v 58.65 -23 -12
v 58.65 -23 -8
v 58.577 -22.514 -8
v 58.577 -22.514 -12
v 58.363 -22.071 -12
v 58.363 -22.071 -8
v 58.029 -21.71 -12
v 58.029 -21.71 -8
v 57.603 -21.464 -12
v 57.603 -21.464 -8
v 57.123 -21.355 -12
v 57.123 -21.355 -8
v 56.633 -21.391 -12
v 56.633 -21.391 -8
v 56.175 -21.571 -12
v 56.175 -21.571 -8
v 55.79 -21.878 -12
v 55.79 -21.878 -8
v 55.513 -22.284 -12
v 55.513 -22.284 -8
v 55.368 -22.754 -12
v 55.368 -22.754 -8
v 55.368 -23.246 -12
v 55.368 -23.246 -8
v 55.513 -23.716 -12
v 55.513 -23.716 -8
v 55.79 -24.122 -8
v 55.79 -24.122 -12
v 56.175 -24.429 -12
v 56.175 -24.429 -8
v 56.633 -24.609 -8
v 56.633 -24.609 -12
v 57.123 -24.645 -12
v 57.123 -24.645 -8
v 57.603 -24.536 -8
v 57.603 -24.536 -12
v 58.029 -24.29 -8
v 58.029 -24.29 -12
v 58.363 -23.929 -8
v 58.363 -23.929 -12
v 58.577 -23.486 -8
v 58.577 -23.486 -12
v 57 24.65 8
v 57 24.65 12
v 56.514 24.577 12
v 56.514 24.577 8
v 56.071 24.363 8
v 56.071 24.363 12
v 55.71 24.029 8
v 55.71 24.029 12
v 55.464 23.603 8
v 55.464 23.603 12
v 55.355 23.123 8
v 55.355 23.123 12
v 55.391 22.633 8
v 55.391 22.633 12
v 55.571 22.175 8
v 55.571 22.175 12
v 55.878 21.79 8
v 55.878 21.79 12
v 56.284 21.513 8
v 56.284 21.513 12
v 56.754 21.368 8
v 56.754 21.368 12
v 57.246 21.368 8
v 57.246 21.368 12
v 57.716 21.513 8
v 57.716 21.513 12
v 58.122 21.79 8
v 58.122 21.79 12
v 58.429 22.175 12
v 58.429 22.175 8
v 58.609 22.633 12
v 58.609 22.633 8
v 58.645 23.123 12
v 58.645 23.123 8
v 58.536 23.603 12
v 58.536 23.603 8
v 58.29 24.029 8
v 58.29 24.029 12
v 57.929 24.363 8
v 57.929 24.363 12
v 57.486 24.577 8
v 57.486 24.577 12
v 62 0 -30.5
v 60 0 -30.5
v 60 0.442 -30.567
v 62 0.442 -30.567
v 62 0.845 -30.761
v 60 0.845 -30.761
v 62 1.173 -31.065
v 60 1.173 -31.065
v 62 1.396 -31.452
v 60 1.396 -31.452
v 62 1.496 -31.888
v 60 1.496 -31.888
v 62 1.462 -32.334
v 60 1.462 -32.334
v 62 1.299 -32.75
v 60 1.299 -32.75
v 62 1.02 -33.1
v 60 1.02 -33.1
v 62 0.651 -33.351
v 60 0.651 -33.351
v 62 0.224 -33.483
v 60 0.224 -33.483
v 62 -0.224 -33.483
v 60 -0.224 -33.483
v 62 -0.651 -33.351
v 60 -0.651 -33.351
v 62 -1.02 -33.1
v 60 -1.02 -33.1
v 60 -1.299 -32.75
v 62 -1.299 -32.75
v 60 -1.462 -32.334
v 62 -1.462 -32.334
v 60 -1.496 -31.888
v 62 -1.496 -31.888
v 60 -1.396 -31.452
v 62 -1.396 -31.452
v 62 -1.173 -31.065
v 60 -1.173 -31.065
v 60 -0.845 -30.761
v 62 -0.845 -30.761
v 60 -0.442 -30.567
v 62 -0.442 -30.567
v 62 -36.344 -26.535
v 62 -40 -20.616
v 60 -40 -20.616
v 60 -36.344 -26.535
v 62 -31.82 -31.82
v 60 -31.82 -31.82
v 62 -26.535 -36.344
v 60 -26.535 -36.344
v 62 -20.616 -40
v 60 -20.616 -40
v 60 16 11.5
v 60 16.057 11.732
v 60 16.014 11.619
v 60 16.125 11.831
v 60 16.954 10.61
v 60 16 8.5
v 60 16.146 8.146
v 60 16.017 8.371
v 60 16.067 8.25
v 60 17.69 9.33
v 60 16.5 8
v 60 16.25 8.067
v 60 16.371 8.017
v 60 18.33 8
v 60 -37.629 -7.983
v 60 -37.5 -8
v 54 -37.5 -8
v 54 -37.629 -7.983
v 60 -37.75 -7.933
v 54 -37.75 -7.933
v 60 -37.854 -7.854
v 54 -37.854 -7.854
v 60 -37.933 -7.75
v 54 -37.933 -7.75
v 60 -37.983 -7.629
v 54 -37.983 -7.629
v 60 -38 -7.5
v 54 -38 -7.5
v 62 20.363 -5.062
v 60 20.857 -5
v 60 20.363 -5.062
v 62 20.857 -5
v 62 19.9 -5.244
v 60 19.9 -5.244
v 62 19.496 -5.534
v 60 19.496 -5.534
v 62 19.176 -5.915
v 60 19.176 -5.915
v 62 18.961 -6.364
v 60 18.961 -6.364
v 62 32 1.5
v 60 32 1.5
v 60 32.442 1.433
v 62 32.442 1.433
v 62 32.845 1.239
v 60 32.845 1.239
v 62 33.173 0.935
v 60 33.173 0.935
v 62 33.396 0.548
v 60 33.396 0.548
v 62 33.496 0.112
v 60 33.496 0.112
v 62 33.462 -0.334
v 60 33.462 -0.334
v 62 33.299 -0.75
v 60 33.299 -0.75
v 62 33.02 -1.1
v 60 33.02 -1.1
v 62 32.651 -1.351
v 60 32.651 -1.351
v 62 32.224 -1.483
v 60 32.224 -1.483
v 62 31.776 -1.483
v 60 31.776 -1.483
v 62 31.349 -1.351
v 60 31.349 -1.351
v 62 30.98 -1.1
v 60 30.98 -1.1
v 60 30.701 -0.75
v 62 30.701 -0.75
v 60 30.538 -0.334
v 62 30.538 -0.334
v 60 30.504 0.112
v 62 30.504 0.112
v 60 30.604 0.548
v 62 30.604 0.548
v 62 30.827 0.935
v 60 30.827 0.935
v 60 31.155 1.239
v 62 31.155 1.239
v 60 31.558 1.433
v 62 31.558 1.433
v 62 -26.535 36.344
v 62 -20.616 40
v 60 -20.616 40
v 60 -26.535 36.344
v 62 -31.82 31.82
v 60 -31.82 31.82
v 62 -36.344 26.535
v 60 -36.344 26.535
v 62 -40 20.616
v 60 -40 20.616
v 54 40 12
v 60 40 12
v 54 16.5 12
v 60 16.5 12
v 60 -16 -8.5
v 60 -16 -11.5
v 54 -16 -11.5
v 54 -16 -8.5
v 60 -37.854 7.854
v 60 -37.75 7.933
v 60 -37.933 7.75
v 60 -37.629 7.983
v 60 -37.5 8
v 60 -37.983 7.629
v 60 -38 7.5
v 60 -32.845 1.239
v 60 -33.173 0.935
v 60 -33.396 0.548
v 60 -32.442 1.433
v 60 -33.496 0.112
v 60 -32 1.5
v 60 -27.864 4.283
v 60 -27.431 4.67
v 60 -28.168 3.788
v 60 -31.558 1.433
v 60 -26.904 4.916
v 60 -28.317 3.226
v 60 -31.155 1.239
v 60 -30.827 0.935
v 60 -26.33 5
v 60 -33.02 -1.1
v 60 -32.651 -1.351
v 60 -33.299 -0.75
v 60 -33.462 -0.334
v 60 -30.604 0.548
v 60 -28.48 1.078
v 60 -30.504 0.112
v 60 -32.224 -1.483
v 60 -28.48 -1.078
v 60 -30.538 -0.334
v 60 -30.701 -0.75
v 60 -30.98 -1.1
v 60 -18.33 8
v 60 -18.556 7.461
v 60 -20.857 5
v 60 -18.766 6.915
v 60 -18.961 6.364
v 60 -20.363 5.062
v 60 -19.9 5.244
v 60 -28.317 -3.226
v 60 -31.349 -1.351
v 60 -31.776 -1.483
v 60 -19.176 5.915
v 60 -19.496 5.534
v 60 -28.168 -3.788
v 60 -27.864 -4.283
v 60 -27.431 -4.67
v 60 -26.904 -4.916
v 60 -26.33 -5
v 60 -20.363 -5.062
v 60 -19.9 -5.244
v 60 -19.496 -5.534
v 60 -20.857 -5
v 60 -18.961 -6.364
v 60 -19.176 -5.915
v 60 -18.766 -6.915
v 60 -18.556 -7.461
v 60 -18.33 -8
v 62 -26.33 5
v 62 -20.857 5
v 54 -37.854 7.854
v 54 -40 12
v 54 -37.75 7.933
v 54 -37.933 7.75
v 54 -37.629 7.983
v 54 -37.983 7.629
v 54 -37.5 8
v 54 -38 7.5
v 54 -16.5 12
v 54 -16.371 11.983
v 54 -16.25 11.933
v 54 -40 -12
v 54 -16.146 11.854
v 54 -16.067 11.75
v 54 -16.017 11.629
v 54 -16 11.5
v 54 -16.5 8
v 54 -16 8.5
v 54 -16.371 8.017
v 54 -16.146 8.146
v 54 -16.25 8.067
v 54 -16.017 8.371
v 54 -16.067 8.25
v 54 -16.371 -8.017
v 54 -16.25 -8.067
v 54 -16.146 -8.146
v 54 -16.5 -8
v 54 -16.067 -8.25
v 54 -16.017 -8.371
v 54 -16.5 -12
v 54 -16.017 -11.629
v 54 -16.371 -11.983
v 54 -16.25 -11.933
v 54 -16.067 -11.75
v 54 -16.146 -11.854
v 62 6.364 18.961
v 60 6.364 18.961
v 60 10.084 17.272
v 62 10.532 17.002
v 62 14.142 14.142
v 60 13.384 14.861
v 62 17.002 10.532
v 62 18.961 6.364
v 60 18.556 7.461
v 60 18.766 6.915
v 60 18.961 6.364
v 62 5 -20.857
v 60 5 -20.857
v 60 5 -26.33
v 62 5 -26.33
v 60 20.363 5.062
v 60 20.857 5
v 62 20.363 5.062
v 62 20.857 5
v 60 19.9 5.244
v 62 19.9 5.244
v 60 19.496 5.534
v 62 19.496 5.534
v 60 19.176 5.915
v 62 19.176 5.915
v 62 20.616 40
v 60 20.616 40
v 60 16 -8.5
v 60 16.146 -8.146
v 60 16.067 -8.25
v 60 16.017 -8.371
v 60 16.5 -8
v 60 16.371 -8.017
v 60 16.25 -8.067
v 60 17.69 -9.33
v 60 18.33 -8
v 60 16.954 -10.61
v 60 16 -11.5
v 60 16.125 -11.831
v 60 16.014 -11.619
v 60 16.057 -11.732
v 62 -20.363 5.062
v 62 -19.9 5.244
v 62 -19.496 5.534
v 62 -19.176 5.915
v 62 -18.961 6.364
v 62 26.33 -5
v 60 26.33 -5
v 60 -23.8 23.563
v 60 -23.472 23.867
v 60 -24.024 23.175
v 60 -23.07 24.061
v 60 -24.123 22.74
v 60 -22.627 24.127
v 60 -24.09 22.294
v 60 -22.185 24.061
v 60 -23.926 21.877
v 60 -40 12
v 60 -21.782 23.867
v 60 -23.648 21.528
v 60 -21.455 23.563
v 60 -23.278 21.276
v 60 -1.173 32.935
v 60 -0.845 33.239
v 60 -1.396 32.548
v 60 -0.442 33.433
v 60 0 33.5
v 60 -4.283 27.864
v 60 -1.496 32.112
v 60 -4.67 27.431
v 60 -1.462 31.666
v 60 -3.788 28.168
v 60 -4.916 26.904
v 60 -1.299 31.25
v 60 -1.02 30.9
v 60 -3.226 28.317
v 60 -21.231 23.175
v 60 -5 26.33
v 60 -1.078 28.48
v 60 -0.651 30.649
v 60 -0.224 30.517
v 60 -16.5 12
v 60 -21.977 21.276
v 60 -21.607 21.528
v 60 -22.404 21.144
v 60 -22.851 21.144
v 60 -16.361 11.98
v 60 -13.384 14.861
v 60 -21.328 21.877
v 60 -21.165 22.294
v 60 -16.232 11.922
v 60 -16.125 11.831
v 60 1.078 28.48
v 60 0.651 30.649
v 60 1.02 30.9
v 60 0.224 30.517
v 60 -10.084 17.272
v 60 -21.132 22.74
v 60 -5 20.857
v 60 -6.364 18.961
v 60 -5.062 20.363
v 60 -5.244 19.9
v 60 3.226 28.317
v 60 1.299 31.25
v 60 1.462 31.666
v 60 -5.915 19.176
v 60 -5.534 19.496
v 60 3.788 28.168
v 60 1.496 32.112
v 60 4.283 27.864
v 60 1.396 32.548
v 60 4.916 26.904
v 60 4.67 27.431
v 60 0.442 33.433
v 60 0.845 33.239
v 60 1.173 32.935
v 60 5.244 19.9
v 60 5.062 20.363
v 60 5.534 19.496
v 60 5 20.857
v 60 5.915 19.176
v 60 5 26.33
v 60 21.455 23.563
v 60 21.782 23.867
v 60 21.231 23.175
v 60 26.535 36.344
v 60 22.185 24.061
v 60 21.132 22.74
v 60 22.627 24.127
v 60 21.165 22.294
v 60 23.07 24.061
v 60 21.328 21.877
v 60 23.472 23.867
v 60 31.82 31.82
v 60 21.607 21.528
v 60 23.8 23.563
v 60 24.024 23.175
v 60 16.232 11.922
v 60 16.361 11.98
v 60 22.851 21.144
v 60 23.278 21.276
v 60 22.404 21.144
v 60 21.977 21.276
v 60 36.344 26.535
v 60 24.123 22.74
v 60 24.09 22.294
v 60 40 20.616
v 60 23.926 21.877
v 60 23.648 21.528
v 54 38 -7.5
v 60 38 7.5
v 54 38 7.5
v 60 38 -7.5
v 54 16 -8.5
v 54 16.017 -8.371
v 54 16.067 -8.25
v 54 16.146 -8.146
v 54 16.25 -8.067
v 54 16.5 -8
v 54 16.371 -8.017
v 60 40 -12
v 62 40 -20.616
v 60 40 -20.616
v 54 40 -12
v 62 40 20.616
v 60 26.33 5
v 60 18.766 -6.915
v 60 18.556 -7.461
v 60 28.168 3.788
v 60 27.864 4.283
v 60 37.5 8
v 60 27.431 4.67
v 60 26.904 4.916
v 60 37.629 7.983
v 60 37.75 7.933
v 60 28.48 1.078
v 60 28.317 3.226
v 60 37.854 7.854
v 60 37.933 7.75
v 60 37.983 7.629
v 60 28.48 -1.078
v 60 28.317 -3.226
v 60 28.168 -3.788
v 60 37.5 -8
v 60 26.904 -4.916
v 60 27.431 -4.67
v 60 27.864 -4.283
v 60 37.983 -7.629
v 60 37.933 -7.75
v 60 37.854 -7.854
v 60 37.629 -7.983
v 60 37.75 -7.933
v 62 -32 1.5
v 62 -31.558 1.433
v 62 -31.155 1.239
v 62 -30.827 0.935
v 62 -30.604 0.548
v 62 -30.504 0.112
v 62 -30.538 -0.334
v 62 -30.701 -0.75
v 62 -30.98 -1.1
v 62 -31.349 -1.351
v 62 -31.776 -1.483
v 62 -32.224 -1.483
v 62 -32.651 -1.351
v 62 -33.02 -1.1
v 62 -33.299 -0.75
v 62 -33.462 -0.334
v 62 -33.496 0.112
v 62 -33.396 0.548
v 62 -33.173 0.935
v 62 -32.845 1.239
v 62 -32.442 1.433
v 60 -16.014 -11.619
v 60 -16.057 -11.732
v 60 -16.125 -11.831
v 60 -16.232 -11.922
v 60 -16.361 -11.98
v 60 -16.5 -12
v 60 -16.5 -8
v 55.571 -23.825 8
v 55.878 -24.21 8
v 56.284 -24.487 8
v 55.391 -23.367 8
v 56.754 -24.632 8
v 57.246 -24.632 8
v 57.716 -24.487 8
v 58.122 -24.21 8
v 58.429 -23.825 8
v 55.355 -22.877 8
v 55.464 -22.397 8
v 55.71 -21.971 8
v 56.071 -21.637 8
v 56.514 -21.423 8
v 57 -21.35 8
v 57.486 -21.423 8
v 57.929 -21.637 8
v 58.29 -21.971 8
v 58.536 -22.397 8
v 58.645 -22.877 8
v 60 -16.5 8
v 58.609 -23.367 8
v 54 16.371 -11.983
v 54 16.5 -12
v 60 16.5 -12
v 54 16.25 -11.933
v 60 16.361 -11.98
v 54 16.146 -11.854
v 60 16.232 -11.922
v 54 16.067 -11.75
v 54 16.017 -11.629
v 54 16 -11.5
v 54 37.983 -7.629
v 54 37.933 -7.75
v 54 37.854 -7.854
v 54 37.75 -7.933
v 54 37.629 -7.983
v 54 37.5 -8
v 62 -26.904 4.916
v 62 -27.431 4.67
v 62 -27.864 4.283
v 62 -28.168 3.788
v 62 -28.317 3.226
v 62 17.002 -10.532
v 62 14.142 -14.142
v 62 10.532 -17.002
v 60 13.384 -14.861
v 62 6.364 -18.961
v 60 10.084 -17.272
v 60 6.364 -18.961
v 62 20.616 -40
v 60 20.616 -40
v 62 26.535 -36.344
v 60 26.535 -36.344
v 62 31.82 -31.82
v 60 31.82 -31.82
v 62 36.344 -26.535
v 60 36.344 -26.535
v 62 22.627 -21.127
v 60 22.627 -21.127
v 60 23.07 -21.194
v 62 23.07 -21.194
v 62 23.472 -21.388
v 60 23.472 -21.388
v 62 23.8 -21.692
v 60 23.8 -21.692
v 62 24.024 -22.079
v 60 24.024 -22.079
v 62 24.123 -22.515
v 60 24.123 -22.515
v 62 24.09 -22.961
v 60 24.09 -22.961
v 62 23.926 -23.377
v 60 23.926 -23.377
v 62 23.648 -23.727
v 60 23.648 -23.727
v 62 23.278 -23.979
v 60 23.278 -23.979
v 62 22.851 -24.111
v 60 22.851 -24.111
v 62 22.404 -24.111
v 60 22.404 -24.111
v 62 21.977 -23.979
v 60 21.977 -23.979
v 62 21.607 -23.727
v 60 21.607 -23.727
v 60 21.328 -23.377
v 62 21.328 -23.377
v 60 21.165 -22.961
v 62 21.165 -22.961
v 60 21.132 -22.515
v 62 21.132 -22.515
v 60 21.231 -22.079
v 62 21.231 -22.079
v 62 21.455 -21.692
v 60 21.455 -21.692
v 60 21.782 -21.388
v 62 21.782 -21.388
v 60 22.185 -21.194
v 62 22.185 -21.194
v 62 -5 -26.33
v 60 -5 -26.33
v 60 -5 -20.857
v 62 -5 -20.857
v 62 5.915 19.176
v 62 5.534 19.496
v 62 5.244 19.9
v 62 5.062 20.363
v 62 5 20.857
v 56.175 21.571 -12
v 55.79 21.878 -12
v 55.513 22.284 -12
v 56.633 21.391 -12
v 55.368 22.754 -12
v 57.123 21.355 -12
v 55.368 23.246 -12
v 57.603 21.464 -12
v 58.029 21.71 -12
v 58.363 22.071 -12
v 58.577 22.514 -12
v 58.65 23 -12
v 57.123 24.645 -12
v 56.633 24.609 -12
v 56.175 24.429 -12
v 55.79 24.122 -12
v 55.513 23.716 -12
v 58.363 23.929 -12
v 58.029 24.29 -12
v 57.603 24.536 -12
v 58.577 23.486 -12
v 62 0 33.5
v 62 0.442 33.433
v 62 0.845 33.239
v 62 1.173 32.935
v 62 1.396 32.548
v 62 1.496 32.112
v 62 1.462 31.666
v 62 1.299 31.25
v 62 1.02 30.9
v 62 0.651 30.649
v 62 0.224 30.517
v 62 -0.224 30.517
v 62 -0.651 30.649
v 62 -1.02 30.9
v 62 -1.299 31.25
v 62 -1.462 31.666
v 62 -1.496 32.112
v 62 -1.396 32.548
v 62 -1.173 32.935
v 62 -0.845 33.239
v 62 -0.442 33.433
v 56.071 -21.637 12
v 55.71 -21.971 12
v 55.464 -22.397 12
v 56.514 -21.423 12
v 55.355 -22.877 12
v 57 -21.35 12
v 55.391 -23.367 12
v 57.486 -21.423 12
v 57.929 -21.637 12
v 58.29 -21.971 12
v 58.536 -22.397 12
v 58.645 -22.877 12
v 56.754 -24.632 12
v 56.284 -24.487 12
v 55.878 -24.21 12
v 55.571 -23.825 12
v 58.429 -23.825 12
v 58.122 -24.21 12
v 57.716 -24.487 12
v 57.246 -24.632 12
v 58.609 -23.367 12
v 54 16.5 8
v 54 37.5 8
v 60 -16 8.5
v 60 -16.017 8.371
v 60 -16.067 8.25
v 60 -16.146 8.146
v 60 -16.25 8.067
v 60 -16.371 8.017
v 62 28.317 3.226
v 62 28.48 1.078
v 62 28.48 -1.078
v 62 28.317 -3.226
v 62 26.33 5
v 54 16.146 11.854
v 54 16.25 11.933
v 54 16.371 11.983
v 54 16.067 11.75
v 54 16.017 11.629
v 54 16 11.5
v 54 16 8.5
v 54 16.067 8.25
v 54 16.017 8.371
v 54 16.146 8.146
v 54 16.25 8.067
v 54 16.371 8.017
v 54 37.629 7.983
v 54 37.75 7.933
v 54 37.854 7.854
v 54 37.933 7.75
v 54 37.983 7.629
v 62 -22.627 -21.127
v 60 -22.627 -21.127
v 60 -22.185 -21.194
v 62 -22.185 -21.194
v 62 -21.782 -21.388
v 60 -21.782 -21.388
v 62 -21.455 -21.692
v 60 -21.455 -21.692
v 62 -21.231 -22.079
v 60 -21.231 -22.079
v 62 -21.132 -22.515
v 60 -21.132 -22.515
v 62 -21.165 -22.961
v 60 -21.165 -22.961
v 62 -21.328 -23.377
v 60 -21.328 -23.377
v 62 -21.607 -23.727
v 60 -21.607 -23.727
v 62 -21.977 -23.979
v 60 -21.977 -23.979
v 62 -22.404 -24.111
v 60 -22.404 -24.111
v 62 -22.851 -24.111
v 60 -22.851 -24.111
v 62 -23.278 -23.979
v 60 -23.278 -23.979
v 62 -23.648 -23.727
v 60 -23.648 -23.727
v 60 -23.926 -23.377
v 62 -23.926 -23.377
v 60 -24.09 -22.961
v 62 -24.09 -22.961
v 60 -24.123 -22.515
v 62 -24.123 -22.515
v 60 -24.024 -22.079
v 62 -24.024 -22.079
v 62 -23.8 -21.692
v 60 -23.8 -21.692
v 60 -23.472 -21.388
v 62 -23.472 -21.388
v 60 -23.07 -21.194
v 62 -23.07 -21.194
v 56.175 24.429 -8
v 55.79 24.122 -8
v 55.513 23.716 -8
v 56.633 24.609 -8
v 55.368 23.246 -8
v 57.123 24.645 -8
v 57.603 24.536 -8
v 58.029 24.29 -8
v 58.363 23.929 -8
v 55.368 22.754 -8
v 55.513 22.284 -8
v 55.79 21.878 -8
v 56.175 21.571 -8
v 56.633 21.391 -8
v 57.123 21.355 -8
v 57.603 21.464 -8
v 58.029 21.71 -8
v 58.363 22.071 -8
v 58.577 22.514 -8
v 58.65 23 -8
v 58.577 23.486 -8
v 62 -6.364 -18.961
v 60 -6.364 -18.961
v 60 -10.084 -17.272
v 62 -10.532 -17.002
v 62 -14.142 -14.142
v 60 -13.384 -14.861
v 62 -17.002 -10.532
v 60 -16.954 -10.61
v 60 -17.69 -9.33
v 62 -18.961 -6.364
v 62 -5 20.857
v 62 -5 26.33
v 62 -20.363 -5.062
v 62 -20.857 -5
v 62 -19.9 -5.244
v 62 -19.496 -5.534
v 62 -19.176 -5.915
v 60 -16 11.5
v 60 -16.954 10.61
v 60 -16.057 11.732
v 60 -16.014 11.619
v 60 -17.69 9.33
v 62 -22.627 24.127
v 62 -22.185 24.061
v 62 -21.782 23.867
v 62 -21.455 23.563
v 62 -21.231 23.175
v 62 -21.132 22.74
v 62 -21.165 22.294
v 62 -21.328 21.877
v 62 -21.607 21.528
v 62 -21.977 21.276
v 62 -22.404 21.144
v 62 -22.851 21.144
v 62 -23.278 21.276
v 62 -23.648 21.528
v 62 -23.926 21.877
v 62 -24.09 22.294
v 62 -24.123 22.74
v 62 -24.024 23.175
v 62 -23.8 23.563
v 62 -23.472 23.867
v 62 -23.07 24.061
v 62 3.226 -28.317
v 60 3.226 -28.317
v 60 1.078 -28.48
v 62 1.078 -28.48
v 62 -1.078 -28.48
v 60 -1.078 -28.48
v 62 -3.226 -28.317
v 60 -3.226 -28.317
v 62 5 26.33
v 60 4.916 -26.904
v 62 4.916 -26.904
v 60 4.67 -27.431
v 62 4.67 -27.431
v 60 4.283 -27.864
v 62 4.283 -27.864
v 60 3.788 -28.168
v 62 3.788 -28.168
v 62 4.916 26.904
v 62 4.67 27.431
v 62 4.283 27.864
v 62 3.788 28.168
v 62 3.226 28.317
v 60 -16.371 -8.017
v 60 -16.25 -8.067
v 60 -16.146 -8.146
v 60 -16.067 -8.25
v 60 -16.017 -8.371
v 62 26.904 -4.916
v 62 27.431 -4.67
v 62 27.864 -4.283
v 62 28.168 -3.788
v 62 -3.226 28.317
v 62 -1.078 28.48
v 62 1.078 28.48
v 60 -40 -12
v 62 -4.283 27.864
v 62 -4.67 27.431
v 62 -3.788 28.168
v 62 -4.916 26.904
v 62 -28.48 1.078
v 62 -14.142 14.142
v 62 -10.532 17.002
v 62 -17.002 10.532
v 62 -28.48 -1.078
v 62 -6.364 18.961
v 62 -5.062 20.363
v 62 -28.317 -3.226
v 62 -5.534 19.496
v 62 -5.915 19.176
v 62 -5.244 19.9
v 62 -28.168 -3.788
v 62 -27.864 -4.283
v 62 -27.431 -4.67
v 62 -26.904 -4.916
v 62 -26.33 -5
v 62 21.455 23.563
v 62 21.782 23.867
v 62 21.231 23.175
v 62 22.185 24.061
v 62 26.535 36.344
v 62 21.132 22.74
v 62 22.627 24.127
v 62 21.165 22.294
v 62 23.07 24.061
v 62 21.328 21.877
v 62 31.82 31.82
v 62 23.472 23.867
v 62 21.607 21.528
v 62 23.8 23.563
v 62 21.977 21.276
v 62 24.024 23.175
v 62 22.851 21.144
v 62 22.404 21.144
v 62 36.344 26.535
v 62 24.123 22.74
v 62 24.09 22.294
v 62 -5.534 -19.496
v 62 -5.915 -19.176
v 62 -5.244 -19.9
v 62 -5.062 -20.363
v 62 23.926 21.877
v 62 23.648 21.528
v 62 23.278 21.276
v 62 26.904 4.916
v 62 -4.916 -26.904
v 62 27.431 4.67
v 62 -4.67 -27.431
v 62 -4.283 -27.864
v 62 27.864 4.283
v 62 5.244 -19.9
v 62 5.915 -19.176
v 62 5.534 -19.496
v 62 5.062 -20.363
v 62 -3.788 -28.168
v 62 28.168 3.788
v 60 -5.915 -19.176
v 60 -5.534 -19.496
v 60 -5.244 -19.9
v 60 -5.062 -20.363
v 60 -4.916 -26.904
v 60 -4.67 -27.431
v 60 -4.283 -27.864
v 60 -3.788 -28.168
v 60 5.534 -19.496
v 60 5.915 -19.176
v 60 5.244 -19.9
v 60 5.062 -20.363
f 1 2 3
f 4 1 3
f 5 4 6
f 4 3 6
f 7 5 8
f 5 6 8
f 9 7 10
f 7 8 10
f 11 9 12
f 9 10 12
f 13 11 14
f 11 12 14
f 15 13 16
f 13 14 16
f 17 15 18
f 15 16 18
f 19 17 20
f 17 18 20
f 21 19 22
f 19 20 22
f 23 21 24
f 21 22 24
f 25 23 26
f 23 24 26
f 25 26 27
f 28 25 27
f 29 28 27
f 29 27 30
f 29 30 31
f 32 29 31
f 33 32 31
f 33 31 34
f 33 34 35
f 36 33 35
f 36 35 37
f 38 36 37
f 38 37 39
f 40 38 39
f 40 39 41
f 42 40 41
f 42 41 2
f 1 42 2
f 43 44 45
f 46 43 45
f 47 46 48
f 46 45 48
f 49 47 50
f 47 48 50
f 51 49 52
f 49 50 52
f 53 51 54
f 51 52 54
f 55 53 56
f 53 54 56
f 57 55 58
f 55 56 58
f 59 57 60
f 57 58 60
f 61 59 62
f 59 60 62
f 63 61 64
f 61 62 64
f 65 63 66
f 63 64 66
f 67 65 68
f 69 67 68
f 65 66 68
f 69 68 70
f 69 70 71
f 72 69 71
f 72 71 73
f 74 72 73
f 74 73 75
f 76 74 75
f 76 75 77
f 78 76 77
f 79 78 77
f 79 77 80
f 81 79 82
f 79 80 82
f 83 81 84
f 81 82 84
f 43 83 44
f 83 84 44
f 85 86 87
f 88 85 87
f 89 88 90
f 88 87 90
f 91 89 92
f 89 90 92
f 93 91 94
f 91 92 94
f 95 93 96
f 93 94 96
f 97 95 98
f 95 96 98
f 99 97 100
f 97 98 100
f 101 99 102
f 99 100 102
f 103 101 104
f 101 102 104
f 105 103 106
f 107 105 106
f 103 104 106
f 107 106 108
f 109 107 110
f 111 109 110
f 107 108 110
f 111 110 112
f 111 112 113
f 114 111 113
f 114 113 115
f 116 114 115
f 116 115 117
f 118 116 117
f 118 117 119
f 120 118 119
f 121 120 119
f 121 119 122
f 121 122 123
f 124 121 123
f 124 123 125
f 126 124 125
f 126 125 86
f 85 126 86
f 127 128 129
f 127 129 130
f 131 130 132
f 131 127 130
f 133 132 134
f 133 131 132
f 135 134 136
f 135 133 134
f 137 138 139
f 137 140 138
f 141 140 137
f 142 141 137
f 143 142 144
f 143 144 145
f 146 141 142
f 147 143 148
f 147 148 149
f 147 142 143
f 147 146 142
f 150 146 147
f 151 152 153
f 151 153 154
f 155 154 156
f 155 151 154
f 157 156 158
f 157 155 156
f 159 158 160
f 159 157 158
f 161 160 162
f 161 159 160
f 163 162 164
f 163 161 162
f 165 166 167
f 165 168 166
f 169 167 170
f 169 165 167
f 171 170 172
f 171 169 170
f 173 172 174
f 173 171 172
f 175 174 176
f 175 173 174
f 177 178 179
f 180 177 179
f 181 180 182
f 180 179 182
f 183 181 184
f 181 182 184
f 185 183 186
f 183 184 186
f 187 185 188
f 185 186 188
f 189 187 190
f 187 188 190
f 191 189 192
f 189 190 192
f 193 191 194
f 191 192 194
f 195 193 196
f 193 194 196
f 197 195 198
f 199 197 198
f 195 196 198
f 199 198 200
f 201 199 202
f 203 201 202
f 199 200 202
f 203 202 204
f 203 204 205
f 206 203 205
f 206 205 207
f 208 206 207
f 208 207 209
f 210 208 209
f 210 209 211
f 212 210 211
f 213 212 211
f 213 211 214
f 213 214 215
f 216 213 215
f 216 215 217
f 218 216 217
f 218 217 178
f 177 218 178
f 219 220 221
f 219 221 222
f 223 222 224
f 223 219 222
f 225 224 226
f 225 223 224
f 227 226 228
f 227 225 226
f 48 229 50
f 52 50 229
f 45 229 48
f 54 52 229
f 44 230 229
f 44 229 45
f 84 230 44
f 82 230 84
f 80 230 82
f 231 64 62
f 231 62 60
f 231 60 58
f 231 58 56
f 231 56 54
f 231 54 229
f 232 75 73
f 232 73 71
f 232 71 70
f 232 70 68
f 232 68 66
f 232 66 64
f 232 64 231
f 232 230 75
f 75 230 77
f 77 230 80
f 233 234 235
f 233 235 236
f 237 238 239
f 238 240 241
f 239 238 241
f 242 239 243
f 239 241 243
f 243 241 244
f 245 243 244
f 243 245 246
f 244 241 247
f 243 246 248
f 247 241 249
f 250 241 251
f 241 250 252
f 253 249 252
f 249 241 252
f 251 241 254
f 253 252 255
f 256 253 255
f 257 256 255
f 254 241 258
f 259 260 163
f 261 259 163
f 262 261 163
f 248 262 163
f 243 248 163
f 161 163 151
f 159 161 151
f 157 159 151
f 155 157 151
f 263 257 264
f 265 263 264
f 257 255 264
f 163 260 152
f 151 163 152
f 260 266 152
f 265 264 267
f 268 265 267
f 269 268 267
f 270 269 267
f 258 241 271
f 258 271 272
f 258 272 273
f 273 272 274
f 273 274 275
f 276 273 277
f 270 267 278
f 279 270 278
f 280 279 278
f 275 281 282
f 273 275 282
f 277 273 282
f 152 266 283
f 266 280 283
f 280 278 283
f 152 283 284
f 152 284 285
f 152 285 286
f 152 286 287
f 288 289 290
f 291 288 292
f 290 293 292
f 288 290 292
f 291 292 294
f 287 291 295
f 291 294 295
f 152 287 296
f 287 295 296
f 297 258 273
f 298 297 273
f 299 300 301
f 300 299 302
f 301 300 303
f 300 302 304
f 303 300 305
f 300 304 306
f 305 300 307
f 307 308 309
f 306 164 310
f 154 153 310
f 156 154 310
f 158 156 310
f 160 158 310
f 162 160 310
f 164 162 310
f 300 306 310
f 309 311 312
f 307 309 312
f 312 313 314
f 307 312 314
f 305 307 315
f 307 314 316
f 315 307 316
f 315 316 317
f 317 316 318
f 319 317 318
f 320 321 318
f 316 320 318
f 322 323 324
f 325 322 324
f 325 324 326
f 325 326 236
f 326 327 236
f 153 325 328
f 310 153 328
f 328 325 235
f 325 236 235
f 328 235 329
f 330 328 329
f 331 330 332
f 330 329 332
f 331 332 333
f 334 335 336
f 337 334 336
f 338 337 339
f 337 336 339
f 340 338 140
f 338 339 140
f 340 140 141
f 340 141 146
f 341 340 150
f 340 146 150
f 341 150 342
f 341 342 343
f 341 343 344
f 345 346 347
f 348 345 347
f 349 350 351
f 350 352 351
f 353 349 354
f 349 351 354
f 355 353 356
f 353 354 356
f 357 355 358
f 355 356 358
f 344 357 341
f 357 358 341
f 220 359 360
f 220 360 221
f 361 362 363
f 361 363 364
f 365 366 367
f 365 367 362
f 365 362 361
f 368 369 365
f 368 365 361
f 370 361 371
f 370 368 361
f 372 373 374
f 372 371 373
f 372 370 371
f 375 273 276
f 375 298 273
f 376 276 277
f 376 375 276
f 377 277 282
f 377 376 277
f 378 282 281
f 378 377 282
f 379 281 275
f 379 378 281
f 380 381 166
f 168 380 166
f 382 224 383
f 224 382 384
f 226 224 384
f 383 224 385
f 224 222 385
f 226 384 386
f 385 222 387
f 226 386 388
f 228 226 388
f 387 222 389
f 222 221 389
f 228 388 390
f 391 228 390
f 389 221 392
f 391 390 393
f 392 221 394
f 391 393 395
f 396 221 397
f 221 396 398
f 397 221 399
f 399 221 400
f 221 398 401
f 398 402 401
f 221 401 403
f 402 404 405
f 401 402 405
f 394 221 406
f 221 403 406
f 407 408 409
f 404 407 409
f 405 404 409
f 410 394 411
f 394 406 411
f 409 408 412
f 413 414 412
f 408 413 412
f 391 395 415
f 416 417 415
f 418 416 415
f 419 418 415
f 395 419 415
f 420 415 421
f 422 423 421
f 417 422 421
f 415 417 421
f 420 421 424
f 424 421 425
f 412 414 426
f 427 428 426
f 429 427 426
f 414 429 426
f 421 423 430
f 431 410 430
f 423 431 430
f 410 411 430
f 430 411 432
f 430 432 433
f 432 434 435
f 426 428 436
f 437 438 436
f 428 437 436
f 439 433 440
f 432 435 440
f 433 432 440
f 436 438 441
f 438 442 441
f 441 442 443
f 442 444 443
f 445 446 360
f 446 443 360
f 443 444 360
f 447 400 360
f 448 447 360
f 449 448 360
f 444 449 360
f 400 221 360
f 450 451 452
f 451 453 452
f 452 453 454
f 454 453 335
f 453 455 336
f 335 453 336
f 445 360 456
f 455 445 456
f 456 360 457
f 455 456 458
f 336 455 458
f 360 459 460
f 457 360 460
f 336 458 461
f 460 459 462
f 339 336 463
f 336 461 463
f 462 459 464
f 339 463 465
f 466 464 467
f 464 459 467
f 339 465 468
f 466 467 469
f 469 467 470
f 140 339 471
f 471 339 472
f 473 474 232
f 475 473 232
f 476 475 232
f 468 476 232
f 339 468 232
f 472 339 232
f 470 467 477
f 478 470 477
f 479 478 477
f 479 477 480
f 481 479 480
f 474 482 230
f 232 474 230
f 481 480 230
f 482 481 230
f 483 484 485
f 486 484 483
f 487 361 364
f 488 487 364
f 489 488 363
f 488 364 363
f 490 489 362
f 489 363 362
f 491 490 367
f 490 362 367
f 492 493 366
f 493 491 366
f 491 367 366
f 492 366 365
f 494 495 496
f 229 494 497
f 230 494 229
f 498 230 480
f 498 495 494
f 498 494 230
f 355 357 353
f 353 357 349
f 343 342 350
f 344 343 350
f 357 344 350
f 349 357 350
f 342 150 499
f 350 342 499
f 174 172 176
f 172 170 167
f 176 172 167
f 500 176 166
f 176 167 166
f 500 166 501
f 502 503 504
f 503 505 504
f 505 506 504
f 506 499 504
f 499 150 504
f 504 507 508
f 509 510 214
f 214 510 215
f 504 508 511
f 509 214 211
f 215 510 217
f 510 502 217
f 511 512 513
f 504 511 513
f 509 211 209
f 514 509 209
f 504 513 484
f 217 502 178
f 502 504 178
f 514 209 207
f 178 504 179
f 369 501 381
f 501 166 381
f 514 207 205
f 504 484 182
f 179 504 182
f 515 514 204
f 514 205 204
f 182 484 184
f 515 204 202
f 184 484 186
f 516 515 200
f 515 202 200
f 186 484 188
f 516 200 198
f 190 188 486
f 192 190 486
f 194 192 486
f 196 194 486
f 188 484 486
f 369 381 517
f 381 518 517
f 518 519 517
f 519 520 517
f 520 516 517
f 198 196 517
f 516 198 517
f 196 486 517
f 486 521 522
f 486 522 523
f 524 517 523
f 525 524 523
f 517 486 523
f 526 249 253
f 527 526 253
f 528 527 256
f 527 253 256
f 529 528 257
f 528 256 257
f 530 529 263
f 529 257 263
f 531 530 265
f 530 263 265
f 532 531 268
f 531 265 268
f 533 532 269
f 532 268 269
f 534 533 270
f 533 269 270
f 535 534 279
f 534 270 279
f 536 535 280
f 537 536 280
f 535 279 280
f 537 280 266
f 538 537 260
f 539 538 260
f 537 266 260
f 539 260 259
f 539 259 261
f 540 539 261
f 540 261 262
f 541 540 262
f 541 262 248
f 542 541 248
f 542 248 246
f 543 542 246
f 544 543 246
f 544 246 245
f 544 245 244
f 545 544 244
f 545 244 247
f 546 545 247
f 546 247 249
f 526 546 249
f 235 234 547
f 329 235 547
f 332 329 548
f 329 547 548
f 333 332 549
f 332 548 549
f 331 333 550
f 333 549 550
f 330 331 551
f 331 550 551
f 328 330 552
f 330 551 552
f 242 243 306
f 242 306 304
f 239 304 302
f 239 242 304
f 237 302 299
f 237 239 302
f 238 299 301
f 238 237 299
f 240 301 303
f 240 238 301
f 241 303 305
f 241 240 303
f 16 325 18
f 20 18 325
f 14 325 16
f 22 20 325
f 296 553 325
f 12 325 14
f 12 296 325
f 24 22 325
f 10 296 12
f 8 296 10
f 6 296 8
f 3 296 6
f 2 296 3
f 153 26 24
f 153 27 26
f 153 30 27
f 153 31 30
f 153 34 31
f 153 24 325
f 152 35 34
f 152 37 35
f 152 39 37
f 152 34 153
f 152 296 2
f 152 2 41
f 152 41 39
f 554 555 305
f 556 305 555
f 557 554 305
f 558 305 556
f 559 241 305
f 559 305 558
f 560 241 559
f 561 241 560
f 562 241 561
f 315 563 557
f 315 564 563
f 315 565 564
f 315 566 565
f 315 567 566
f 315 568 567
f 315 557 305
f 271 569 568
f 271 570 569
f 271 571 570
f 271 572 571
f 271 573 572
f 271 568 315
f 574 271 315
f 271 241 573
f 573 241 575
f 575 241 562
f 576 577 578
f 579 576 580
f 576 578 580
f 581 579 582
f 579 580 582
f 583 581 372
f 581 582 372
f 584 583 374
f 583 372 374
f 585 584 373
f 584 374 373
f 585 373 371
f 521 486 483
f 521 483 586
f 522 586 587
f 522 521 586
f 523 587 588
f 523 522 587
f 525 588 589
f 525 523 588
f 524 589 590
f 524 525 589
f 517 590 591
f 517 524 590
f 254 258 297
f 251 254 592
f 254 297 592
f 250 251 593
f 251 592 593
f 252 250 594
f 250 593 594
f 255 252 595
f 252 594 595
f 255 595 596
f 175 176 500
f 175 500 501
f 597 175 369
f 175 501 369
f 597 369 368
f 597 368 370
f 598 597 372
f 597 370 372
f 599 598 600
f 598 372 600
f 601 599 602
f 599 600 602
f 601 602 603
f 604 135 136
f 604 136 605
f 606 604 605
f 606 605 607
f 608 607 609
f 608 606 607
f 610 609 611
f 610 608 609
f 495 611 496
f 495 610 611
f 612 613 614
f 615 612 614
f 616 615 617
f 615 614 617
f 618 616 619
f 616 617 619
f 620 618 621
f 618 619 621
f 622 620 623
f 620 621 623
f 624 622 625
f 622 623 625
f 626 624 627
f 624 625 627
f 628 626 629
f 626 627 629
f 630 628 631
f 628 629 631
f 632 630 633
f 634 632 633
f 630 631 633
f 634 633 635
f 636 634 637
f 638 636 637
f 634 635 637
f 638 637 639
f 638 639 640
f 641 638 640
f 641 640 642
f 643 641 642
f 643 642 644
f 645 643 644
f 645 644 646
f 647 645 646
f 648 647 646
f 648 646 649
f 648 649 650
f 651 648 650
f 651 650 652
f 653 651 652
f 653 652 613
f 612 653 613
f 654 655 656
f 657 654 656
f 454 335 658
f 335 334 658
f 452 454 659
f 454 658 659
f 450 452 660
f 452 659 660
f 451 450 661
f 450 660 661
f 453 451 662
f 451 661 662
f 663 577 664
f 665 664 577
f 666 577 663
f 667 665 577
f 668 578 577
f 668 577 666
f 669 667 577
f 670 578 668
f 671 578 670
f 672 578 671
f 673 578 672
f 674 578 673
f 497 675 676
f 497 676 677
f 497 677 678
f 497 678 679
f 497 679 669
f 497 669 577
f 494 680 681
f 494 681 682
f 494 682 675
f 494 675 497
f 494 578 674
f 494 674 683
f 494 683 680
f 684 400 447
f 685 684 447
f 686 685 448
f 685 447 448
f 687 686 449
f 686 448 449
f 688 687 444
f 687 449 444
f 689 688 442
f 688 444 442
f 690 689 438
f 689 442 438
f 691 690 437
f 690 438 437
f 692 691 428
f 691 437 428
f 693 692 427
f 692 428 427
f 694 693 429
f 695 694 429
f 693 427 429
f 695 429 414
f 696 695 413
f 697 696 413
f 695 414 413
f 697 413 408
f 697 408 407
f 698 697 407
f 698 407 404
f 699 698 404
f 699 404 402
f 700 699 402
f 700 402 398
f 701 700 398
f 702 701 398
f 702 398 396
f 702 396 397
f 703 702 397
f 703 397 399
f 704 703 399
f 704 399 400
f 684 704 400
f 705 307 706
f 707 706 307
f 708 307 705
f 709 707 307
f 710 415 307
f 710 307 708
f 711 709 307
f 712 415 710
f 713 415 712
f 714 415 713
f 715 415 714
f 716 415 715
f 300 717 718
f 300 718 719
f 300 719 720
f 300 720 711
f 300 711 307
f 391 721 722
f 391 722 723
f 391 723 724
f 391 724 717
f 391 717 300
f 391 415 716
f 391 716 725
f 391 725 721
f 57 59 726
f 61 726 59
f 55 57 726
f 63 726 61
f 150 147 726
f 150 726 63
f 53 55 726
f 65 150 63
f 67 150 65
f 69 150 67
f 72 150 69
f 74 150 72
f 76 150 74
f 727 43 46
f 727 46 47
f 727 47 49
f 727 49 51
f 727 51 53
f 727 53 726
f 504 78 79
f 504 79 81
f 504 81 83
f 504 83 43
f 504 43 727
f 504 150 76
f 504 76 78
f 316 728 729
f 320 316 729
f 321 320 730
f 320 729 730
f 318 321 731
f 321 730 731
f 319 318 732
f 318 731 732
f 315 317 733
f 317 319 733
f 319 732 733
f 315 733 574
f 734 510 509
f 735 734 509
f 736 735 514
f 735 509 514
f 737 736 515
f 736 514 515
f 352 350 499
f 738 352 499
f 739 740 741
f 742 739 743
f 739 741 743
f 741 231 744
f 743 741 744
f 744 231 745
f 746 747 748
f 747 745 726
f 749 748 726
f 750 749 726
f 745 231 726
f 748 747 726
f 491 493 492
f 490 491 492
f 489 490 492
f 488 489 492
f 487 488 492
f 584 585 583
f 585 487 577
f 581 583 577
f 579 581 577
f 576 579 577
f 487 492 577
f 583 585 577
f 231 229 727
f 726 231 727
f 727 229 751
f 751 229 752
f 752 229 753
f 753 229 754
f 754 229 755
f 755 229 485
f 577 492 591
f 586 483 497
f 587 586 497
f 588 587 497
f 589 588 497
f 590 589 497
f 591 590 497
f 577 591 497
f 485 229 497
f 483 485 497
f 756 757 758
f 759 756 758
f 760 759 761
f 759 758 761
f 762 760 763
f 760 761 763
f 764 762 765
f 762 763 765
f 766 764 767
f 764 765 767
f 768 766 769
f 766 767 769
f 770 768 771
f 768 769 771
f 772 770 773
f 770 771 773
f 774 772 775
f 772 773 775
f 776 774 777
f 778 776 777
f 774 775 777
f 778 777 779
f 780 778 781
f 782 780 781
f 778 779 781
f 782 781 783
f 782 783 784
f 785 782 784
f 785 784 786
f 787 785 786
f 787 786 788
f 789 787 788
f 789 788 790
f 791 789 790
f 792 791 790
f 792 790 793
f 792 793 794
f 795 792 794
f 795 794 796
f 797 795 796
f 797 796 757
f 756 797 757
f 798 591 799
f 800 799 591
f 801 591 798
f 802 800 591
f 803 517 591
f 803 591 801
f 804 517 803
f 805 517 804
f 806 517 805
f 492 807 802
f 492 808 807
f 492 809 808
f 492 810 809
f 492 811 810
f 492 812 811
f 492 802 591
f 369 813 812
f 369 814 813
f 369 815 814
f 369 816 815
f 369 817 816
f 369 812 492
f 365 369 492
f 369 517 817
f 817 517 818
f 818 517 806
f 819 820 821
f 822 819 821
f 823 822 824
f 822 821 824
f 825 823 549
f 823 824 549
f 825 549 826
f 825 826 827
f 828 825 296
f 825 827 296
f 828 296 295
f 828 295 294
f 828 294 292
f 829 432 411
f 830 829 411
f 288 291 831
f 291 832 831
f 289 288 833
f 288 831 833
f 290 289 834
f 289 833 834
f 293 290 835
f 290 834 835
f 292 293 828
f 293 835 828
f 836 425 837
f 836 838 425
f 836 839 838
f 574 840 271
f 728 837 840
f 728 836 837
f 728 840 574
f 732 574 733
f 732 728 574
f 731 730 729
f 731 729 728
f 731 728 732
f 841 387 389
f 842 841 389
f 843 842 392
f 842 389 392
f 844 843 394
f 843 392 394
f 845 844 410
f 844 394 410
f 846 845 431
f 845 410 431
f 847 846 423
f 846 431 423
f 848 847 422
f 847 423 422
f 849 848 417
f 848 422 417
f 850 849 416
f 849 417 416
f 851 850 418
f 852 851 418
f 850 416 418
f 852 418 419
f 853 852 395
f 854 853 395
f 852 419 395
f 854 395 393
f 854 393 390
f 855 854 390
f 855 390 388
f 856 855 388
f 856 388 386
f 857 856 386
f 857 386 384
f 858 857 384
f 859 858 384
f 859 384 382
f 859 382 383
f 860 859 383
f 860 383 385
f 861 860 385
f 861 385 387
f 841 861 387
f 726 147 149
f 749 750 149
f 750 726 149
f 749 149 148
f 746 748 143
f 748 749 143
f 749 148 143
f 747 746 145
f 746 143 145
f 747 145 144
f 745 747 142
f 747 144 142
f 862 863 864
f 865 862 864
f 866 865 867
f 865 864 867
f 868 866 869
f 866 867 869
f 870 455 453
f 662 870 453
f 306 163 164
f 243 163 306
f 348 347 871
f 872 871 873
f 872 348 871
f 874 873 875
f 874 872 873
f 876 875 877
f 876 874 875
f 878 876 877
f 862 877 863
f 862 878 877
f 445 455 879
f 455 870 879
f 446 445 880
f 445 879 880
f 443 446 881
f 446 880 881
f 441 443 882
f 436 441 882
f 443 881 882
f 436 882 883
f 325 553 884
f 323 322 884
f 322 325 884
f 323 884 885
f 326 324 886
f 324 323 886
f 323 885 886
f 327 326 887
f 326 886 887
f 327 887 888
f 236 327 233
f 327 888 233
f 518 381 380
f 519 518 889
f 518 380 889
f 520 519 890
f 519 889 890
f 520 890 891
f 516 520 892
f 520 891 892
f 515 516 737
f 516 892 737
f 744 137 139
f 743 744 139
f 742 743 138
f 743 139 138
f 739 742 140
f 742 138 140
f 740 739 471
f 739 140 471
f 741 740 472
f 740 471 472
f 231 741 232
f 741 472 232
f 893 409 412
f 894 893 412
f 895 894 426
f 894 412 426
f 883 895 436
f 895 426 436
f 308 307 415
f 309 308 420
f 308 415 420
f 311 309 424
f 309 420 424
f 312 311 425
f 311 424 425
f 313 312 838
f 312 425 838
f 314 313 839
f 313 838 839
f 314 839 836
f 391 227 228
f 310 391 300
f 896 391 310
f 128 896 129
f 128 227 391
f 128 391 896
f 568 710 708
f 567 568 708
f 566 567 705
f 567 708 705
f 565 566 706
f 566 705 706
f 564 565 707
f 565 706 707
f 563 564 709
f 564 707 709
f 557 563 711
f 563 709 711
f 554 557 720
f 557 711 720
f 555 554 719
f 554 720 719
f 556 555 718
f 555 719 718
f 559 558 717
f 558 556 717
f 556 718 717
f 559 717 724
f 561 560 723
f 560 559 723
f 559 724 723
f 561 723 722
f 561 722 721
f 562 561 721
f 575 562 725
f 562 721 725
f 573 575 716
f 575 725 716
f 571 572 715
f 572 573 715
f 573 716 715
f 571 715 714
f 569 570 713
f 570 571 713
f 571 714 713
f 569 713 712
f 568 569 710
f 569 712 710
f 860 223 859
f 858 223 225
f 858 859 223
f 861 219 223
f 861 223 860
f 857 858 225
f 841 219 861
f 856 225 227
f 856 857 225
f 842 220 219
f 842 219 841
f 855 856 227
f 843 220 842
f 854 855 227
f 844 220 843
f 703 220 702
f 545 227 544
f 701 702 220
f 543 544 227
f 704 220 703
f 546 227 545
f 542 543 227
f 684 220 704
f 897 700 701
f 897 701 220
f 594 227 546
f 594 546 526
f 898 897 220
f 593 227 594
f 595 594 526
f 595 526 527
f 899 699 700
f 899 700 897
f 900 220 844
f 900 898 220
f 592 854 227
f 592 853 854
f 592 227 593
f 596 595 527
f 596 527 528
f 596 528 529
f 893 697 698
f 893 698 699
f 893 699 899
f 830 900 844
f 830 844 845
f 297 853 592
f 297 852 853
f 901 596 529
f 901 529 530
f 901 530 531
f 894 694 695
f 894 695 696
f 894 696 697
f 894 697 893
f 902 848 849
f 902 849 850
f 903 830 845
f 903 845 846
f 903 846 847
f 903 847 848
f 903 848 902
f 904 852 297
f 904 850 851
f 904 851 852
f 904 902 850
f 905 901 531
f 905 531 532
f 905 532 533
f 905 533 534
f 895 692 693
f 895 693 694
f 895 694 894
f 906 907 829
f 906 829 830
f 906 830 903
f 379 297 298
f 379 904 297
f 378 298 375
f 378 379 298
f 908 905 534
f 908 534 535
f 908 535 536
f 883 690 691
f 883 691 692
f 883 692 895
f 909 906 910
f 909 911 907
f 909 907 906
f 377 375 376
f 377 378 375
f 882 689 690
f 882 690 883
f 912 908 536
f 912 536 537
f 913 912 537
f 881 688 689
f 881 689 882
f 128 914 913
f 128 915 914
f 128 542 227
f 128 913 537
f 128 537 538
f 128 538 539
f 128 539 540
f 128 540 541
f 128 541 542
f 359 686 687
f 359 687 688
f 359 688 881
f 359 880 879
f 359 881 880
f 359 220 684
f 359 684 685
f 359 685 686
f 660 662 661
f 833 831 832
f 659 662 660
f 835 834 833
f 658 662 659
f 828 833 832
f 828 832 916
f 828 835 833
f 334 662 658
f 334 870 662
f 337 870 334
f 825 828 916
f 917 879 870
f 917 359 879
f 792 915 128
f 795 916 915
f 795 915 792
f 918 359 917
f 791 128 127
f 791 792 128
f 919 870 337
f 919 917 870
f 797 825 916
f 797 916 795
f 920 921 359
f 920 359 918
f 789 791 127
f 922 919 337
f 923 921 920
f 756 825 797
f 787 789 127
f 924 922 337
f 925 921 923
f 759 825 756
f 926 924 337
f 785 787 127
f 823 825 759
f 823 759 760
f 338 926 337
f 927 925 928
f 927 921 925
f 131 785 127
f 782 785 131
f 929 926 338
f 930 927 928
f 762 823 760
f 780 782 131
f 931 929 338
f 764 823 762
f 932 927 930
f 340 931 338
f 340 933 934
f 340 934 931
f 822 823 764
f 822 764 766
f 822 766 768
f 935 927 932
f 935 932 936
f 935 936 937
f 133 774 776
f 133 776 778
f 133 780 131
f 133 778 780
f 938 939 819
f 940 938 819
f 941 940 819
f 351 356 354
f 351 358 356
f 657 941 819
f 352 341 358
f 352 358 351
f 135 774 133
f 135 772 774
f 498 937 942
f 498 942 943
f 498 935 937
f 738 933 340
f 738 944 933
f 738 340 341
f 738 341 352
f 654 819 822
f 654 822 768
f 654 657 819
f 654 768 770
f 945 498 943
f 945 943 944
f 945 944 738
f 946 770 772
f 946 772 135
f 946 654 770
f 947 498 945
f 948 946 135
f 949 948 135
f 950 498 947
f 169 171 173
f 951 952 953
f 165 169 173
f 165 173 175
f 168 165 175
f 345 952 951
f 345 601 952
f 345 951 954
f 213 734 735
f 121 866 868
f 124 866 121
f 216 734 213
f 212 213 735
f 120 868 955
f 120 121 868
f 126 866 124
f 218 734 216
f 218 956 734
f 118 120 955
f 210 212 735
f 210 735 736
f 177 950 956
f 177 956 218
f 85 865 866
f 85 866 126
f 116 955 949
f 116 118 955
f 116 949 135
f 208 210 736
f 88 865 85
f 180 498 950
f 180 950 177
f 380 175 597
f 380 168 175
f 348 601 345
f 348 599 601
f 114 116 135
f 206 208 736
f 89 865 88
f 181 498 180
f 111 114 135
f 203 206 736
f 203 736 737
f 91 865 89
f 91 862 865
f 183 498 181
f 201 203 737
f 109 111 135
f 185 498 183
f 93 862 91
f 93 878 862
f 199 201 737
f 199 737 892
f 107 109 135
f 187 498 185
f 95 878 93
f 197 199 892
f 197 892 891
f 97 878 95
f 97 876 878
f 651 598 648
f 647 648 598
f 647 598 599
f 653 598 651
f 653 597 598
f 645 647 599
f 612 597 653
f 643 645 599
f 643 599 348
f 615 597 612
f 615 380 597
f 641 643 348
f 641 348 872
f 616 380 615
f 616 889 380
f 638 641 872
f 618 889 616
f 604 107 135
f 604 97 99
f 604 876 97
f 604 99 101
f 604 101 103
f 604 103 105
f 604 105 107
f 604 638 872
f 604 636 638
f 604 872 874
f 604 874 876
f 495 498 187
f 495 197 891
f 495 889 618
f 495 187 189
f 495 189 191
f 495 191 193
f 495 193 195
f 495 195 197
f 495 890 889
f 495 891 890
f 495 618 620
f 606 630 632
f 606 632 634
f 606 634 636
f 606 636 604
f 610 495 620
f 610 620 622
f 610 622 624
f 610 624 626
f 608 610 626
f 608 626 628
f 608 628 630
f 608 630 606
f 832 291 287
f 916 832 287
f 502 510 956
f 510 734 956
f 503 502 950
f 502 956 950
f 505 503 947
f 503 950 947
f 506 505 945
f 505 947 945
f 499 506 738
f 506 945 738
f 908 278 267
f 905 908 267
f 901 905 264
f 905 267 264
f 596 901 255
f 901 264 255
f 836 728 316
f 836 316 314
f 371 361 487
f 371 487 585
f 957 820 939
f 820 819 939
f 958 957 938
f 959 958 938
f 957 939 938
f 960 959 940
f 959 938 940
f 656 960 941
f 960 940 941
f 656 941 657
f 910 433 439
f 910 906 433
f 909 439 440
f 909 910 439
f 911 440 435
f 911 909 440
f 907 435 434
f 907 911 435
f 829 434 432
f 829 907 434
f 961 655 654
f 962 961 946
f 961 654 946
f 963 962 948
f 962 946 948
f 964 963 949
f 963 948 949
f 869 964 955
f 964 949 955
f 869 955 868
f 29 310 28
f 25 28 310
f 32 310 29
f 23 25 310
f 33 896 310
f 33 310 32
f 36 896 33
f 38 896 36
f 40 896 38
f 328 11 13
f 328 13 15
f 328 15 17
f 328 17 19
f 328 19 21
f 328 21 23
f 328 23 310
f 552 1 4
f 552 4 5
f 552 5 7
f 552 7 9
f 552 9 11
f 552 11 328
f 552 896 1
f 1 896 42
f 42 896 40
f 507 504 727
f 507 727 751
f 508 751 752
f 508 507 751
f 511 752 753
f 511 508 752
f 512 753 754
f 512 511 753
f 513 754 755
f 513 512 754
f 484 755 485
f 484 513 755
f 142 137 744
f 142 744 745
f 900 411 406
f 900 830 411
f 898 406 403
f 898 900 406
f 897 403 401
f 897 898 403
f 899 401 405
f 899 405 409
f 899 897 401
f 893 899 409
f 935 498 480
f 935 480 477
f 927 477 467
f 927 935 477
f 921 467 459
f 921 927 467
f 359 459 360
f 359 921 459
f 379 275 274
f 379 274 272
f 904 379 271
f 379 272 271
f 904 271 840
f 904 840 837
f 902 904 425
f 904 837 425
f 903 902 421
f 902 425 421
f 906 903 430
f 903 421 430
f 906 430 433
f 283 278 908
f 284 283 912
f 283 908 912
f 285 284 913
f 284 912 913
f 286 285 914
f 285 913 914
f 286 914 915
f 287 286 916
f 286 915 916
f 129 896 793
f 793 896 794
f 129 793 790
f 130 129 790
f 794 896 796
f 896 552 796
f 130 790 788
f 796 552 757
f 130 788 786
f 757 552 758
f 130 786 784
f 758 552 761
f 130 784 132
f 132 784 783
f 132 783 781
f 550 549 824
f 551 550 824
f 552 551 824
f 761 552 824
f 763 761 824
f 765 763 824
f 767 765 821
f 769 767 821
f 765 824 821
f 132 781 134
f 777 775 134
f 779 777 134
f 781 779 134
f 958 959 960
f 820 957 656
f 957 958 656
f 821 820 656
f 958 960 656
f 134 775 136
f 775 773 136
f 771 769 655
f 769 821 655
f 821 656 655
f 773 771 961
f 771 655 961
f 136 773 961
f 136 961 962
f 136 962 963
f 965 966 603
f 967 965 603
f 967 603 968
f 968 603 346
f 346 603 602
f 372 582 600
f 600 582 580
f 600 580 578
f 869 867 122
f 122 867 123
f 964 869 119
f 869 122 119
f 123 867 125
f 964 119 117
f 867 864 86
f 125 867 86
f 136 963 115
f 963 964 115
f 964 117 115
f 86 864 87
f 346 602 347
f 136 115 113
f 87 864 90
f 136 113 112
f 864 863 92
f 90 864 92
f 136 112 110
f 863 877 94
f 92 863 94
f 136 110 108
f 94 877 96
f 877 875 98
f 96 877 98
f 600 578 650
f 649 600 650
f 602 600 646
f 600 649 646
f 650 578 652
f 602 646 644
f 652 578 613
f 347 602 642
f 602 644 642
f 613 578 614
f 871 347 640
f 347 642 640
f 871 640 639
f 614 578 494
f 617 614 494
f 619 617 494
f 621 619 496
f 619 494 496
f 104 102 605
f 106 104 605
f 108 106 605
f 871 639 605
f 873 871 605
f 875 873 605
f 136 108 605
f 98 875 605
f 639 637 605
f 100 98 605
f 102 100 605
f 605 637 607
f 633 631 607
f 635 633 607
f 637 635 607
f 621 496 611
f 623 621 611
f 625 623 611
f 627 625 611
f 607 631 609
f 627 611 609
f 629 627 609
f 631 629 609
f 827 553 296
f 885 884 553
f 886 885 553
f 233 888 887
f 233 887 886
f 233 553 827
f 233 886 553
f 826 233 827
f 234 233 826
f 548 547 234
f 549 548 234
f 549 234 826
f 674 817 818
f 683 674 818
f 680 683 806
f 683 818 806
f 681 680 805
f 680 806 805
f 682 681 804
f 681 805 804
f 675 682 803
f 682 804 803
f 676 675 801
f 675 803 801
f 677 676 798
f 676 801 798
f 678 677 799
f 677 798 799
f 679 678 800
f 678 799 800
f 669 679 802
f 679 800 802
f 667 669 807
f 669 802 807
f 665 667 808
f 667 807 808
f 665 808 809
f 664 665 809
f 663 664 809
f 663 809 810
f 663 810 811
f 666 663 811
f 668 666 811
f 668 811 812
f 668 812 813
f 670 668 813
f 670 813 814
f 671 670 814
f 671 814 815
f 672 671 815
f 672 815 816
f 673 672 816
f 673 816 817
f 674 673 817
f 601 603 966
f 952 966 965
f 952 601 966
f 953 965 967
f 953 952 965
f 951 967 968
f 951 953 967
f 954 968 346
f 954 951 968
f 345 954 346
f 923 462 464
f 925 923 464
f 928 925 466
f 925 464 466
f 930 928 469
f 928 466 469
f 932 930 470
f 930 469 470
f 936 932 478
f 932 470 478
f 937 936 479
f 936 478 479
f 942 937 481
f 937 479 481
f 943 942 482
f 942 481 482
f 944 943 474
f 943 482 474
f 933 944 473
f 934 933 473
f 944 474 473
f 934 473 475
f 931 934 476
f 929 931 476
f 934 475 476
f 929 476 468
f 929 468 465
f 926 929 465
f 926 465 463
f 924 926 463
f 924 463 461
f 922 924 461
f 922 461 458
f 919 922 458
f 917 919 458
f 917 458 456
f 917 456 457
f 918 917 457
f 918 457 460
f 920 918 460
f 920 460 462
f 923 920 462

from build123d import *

# Parameters (mm, degrees)
EXTRUDE_1_DEPTH                  = 2
CUT_EXTRUDE_1_DEPTH              = 57.603886792
EXTRUDE_2_DEPTH                  = 6
EXTRUDE_3_DEPTH                  = 6
SKETCH_5_W                       = 1.65
SKETCH_5_H                       = 32
HOLE_WIZARD_3_3_3_3_1_AT_2_COUNT = 2
HOLE_WIZARD_3_3_3_3_1_AT_2_PITCH = 46
HOLE_WIZARD_3_3_3_3_2_D          = 3.3
HOLE_WIZARD_3_3_3_3_2_DEPTH      = 52
HOLE_WIZARD_3_0_3_1_D            = 3
HOLE_WIZARD_3_0_3_1_DEPTH        = 8
FILLET_1_R                       = 0.5
FILLET_2_R                       = 2


with BuildPart() as part:
    # 草图1 → 凸台-拉伸1 (new body)
    with BuildSketch(Plane(origin=(62, 0, 0), x_dir=(0, 0, -1), z_dir=(1, 0, 0))):
        with BuildLine():
            Line((20.615528128, 40), (-20.615528128, 40))
            ThreePointArc((-20.615528128, 40), (-31.819805153, 31.819805153), (-40, 20.615528128))
            Line((-40, 20.615528128), (-40, -20.615528128))
            ThreePointArc((-40, -20.615528128), (-31.819805153, -31.819805153), (-20.615528128, -40))
            Line((-20.615528128, -40), (20.615528128, -40))
            ThreePointArc((20.615528128, -40), (31.819805153, -31.819805153), (40, -20.615528128))
            Line((40, -20.615528128), (40, 20.615528128))
            ThreePointArc((40, 20.615528128), (31.819805153, 31.819805153), (20.615528128, 40))
        make_face()
    extrude(amount=-EXTRUDE_1_DEPTH)

    # 草图2 → 切除-拉伸1 (cut, through all)
    with BuildSketch(Plane.ZY.offset(-60)):
        with BuildLine():
            Line((5, -28.057975693), (5, -19.364916731))
            ThreePointArc((5, -19.364916731), (14.142135624, -14.142135624), (19.364916731, -5))
            Line((19.364916731, -5), (28.057975693, -5))
            ThreePointArc((28.057975693, -5), (28.5, 0), (28.057975693, 5))
            Line((28.057975693, 5), (19.364916731, 5))
            ThreePointArc((19.364916731, 5), (14.142135624, 14.142135624), (5, 19.364916731))
            Line((5, 19.364916731), (5, 28.057975693))
            ThreePointArc((5, 28.057975693), (0, 28.5), (-5, 28.057975693))
            Line((-5, 28.057975693), (-5, 19.364916731))
            ThreePointArc((-5, 19.364916731), (-14.142135624, 14.142135624), (-19.364916731, 5))
            Line((-19.364916731, 5), (-28.057975693, 5))
            ThreePointArc((-28.057975693, 5), (-28.5, 0), (-28.057975693, -5))
            Line((-28.057975693, -5), (-19.364916731, -5))
            ThreePointArc((-19.364916731, -5), (-14.142135624, -14.142135624), (-5, -19.364916731))
            Line((-5, -19.364916731), (-5, -28.057975693))
            ThreePointArc((-5, -28.057975693), (0, -28.5), (5, -28.057975693))
        make_face()
    extrude(amount=-CUT_EXTRUDE_1_DEPTH, mode=Mode.SUBTRACT)

    # 草图3 → 凸台-拉伸2 (add)
    with BuildSketch(Plane.ZY.offset(-60)):
        Polygon((12, -16), (12, -40), (-12, -40), (-12, -16), (-8, -16), (-8, -38), (8, -38), (8, -16), align=None)
    extrude(amount=EXTRUDE_2_DEPTH)

    # 草图4 → 凸台-拉伸3 (add)
    with BuildSketch(Plane.ZY.offset(-60)):
        Polygon((12, 16), (8, 16), (8, 38), (-8, 38), (-8, 16), (-12, 16), (-12, 40), (12, 40), align=None)
    extrude(amount=EXTRUDE_3_DEPTH)

    # 草图5 → Ø3.3 (3.3) 直径孔1 (revolve, cut)
    with BuildSketch(Plane(origin=(57, -23, 8), x_dir=(0, 1, 0), z_dir=(1, 0, 0))):
        with Locations((0.825, 16)):
            Rectangle(SKETCH_5_W, SKETCH_5_H)
    hole_wizard_3_3_3_3_1 = revolve(axis=Axis((57, -23, 1.65), (0, 0, 1)), mode=Mode.SUBTRACT)

    # Ø3.3 (3.3) 直径孔1 at 2: Ø3.3 (3.3) 直径孔1 ×2
    with Locations(*[(0, i * HOLE_WIZARD_3_3_3_3_1_AT_2_PITCH, 0) for i in range(1, HOLE_WIZARD_3_3_3_3_1_AT_2_COUNT)]):
        add(hole_wizard_3_3_3_3_1, mode=Mode.SUBTRACT)

    # Ø3.3 (3.3) 直径孔2
    with Locations(Plane(origin=(0, 0, -12), x_dir=(-1, 0, 0), z_dir=(0, 0, -1))):
        with Locations((-57, -23), (-57, 23)):
            Hole(HOLE_WIZARD_3_3_3_3_2_D / 2, depth=HOLE_WIZARD_3_3_3_3_2_DEPTH)

    # Ø3.0 (3) 直径孔1
    with Locations(Plane(origin=(62, 0, 0), x_dir=(0, 0, -1), z_dir=(1, 0, 0))):
        with Locations((0, 32), (-22.627416998, 22.627416998), (-32, 0), (-22.627416998, -22.627416998), (0, -32), (22.627416998, -22.627416998), (32, 0), (22.627416998, 22.627416998)):
            Hole(HOLE_WIZARD_3_0_3_1_D / 2, depth=HOLE_WIZARD_3_0_3_1_DEPTH)

    # 圆角1
    # the kernel refuses this fillet: 0.5 mm, written as the material it adds along each edge
    with BuildSketch(Plane(origin=(61.25, 38, -8), x_dir=(0, 0, 1), z_dir=(-1, 0, 0)), Plane(origin=(61.25, 38, 8), x_dir=(0, -1, 0), z_dir=(-1, 0, 0)), Plane(origin=(61.25, -38, 8), x_dir=(0, 0, -1), z_dir=(-1, 0, 0)), Plane(origin=(61.25, -38, -8), x_dir=(0, 1, 0), z_dir=(-1, 0, 0))) as fillet_1_piece_1:
        with BuildLine():
            CenterArc((FILLET_1_R, -FILLET_1_R), FILLET_1_R, 90, 90)
            Line((0, -FILLET_1_R), (0, 0))
            Line((0, 0), (FILLET_1_R, 0))
        make_face()
    extrude(amount=7.25)
    # the kernel refuses this fillet: 0.5 mm, written as the material it takes off along each edge
    with BuildSketch(Plane(origin=(60, 16, 12), x_dir=(0, 1, 0), z_dir=(-1, 0, 0)), Plane(origin=(60, -16, -12), x_dir=(0, -1, 0), z_dir=(-1, 0, 0))) as fillet_1_2_piece_1:
        with BuildLine():
            CenterArc((FILLET_1_R, FILLET_1_R), FILLET_1_R, 180, 90)
            Line((0, FILLET_1_R), (0, 0))
            Line((0, 0), (FILLET_1_R, 0))
        make_face()
    extrude(amount=7.25, mode=Mode.SUBTRACT)
    with BuildSketch(Plane(origin=(60, 16, -12), x_dir=(0, 1, 0), z_dir=(-1, 0, 0)), Plane(origin=(60, -16, 12), x_dir=(0, -1, 0), z_dir=(-1, 0, 0))) as fillet_1_2_piece_2:
        with BuildLine():
            CenterArc((FILLET_1_R, -FILLET_1_R), FILLET_1_R, 90, 90)
            Line((0, -FILLET_1_R), (0, 0))
            Line((0, 0), (FILLET_1_R, 0))
        make_face()
    extrude(amount=7.25, mode=Mode.SUBTRACT)
    with BuildSketch(Plane(origin=(61.25, 16, -8), x_dir=(0, 0, -1), z_dir=(-1, 0, 0)), Plane(origin=(61.25, -16, 8), x_dir=(0, 0, 1), z_dir=(-1, 0, 0))) as fillet_1_2_piece_3:
        with BuildLine():
            CenterArc((FILLET_1_R, -FILLET_1_R), FILLET_1_R, 90, 90)
            Line((0, -FILLET_1_R), (0, 0))
            Line((0, 0), (FILLET_1_R, 0))
        make_face()
    extrude(amount=8.5, mode=Mode.SUBTRACT)
    with BuildSketch(Plane(origin=(61.25, 16, 8), x_dir=(0, 0, 1), z_dir=(-1, 0, 0)), Plane(origin=(61.25, -16, -8), x_dir=(0, 0, -1), z_dir=(-1, 0, 0))) as fillet_1_2_piece_4:
        with BuildLine():
            CenterArc((FILLET_1_R, FILLET_1_R), FILLET_1_R, 180, 90)
            Line((0, FILLET_1_R), (0, 0))
            Line((0, 0), (FILLET_1_R, 0))
        make_face()
    extrude(amount=8.5, mode=Mode.SUBTRACT)

    # 圆角2
    fillet_2_edges = [part.edges().sort_by_distance(p)[0] for p in [
        (61, -28.057975693, 5),
        (61, -28.057975693, -5),
        (61, -19.364916731, -5),
        (61, -5, -19.364916731),
        (61, -5, -28.057975693),
        (61, 5, -28.057975693),
        (61, 5, -19.364916731),
        (61, 19.364916731, -5),
        (61, 28.057975693, -5),
        (61, 28.057975693, 5),
        (61, 19.364916731, 5),
        (61, 5, 19.364916731),
        (61, 5, 28.057975693),
        (61, -5, 28.057975693),
        (61, -5, 19.364916731),
        (61, -19.364916731, 5),
    ]]
    fillet(fillet_2_edges, radius=FILLET_2_R)


solid = part.part
